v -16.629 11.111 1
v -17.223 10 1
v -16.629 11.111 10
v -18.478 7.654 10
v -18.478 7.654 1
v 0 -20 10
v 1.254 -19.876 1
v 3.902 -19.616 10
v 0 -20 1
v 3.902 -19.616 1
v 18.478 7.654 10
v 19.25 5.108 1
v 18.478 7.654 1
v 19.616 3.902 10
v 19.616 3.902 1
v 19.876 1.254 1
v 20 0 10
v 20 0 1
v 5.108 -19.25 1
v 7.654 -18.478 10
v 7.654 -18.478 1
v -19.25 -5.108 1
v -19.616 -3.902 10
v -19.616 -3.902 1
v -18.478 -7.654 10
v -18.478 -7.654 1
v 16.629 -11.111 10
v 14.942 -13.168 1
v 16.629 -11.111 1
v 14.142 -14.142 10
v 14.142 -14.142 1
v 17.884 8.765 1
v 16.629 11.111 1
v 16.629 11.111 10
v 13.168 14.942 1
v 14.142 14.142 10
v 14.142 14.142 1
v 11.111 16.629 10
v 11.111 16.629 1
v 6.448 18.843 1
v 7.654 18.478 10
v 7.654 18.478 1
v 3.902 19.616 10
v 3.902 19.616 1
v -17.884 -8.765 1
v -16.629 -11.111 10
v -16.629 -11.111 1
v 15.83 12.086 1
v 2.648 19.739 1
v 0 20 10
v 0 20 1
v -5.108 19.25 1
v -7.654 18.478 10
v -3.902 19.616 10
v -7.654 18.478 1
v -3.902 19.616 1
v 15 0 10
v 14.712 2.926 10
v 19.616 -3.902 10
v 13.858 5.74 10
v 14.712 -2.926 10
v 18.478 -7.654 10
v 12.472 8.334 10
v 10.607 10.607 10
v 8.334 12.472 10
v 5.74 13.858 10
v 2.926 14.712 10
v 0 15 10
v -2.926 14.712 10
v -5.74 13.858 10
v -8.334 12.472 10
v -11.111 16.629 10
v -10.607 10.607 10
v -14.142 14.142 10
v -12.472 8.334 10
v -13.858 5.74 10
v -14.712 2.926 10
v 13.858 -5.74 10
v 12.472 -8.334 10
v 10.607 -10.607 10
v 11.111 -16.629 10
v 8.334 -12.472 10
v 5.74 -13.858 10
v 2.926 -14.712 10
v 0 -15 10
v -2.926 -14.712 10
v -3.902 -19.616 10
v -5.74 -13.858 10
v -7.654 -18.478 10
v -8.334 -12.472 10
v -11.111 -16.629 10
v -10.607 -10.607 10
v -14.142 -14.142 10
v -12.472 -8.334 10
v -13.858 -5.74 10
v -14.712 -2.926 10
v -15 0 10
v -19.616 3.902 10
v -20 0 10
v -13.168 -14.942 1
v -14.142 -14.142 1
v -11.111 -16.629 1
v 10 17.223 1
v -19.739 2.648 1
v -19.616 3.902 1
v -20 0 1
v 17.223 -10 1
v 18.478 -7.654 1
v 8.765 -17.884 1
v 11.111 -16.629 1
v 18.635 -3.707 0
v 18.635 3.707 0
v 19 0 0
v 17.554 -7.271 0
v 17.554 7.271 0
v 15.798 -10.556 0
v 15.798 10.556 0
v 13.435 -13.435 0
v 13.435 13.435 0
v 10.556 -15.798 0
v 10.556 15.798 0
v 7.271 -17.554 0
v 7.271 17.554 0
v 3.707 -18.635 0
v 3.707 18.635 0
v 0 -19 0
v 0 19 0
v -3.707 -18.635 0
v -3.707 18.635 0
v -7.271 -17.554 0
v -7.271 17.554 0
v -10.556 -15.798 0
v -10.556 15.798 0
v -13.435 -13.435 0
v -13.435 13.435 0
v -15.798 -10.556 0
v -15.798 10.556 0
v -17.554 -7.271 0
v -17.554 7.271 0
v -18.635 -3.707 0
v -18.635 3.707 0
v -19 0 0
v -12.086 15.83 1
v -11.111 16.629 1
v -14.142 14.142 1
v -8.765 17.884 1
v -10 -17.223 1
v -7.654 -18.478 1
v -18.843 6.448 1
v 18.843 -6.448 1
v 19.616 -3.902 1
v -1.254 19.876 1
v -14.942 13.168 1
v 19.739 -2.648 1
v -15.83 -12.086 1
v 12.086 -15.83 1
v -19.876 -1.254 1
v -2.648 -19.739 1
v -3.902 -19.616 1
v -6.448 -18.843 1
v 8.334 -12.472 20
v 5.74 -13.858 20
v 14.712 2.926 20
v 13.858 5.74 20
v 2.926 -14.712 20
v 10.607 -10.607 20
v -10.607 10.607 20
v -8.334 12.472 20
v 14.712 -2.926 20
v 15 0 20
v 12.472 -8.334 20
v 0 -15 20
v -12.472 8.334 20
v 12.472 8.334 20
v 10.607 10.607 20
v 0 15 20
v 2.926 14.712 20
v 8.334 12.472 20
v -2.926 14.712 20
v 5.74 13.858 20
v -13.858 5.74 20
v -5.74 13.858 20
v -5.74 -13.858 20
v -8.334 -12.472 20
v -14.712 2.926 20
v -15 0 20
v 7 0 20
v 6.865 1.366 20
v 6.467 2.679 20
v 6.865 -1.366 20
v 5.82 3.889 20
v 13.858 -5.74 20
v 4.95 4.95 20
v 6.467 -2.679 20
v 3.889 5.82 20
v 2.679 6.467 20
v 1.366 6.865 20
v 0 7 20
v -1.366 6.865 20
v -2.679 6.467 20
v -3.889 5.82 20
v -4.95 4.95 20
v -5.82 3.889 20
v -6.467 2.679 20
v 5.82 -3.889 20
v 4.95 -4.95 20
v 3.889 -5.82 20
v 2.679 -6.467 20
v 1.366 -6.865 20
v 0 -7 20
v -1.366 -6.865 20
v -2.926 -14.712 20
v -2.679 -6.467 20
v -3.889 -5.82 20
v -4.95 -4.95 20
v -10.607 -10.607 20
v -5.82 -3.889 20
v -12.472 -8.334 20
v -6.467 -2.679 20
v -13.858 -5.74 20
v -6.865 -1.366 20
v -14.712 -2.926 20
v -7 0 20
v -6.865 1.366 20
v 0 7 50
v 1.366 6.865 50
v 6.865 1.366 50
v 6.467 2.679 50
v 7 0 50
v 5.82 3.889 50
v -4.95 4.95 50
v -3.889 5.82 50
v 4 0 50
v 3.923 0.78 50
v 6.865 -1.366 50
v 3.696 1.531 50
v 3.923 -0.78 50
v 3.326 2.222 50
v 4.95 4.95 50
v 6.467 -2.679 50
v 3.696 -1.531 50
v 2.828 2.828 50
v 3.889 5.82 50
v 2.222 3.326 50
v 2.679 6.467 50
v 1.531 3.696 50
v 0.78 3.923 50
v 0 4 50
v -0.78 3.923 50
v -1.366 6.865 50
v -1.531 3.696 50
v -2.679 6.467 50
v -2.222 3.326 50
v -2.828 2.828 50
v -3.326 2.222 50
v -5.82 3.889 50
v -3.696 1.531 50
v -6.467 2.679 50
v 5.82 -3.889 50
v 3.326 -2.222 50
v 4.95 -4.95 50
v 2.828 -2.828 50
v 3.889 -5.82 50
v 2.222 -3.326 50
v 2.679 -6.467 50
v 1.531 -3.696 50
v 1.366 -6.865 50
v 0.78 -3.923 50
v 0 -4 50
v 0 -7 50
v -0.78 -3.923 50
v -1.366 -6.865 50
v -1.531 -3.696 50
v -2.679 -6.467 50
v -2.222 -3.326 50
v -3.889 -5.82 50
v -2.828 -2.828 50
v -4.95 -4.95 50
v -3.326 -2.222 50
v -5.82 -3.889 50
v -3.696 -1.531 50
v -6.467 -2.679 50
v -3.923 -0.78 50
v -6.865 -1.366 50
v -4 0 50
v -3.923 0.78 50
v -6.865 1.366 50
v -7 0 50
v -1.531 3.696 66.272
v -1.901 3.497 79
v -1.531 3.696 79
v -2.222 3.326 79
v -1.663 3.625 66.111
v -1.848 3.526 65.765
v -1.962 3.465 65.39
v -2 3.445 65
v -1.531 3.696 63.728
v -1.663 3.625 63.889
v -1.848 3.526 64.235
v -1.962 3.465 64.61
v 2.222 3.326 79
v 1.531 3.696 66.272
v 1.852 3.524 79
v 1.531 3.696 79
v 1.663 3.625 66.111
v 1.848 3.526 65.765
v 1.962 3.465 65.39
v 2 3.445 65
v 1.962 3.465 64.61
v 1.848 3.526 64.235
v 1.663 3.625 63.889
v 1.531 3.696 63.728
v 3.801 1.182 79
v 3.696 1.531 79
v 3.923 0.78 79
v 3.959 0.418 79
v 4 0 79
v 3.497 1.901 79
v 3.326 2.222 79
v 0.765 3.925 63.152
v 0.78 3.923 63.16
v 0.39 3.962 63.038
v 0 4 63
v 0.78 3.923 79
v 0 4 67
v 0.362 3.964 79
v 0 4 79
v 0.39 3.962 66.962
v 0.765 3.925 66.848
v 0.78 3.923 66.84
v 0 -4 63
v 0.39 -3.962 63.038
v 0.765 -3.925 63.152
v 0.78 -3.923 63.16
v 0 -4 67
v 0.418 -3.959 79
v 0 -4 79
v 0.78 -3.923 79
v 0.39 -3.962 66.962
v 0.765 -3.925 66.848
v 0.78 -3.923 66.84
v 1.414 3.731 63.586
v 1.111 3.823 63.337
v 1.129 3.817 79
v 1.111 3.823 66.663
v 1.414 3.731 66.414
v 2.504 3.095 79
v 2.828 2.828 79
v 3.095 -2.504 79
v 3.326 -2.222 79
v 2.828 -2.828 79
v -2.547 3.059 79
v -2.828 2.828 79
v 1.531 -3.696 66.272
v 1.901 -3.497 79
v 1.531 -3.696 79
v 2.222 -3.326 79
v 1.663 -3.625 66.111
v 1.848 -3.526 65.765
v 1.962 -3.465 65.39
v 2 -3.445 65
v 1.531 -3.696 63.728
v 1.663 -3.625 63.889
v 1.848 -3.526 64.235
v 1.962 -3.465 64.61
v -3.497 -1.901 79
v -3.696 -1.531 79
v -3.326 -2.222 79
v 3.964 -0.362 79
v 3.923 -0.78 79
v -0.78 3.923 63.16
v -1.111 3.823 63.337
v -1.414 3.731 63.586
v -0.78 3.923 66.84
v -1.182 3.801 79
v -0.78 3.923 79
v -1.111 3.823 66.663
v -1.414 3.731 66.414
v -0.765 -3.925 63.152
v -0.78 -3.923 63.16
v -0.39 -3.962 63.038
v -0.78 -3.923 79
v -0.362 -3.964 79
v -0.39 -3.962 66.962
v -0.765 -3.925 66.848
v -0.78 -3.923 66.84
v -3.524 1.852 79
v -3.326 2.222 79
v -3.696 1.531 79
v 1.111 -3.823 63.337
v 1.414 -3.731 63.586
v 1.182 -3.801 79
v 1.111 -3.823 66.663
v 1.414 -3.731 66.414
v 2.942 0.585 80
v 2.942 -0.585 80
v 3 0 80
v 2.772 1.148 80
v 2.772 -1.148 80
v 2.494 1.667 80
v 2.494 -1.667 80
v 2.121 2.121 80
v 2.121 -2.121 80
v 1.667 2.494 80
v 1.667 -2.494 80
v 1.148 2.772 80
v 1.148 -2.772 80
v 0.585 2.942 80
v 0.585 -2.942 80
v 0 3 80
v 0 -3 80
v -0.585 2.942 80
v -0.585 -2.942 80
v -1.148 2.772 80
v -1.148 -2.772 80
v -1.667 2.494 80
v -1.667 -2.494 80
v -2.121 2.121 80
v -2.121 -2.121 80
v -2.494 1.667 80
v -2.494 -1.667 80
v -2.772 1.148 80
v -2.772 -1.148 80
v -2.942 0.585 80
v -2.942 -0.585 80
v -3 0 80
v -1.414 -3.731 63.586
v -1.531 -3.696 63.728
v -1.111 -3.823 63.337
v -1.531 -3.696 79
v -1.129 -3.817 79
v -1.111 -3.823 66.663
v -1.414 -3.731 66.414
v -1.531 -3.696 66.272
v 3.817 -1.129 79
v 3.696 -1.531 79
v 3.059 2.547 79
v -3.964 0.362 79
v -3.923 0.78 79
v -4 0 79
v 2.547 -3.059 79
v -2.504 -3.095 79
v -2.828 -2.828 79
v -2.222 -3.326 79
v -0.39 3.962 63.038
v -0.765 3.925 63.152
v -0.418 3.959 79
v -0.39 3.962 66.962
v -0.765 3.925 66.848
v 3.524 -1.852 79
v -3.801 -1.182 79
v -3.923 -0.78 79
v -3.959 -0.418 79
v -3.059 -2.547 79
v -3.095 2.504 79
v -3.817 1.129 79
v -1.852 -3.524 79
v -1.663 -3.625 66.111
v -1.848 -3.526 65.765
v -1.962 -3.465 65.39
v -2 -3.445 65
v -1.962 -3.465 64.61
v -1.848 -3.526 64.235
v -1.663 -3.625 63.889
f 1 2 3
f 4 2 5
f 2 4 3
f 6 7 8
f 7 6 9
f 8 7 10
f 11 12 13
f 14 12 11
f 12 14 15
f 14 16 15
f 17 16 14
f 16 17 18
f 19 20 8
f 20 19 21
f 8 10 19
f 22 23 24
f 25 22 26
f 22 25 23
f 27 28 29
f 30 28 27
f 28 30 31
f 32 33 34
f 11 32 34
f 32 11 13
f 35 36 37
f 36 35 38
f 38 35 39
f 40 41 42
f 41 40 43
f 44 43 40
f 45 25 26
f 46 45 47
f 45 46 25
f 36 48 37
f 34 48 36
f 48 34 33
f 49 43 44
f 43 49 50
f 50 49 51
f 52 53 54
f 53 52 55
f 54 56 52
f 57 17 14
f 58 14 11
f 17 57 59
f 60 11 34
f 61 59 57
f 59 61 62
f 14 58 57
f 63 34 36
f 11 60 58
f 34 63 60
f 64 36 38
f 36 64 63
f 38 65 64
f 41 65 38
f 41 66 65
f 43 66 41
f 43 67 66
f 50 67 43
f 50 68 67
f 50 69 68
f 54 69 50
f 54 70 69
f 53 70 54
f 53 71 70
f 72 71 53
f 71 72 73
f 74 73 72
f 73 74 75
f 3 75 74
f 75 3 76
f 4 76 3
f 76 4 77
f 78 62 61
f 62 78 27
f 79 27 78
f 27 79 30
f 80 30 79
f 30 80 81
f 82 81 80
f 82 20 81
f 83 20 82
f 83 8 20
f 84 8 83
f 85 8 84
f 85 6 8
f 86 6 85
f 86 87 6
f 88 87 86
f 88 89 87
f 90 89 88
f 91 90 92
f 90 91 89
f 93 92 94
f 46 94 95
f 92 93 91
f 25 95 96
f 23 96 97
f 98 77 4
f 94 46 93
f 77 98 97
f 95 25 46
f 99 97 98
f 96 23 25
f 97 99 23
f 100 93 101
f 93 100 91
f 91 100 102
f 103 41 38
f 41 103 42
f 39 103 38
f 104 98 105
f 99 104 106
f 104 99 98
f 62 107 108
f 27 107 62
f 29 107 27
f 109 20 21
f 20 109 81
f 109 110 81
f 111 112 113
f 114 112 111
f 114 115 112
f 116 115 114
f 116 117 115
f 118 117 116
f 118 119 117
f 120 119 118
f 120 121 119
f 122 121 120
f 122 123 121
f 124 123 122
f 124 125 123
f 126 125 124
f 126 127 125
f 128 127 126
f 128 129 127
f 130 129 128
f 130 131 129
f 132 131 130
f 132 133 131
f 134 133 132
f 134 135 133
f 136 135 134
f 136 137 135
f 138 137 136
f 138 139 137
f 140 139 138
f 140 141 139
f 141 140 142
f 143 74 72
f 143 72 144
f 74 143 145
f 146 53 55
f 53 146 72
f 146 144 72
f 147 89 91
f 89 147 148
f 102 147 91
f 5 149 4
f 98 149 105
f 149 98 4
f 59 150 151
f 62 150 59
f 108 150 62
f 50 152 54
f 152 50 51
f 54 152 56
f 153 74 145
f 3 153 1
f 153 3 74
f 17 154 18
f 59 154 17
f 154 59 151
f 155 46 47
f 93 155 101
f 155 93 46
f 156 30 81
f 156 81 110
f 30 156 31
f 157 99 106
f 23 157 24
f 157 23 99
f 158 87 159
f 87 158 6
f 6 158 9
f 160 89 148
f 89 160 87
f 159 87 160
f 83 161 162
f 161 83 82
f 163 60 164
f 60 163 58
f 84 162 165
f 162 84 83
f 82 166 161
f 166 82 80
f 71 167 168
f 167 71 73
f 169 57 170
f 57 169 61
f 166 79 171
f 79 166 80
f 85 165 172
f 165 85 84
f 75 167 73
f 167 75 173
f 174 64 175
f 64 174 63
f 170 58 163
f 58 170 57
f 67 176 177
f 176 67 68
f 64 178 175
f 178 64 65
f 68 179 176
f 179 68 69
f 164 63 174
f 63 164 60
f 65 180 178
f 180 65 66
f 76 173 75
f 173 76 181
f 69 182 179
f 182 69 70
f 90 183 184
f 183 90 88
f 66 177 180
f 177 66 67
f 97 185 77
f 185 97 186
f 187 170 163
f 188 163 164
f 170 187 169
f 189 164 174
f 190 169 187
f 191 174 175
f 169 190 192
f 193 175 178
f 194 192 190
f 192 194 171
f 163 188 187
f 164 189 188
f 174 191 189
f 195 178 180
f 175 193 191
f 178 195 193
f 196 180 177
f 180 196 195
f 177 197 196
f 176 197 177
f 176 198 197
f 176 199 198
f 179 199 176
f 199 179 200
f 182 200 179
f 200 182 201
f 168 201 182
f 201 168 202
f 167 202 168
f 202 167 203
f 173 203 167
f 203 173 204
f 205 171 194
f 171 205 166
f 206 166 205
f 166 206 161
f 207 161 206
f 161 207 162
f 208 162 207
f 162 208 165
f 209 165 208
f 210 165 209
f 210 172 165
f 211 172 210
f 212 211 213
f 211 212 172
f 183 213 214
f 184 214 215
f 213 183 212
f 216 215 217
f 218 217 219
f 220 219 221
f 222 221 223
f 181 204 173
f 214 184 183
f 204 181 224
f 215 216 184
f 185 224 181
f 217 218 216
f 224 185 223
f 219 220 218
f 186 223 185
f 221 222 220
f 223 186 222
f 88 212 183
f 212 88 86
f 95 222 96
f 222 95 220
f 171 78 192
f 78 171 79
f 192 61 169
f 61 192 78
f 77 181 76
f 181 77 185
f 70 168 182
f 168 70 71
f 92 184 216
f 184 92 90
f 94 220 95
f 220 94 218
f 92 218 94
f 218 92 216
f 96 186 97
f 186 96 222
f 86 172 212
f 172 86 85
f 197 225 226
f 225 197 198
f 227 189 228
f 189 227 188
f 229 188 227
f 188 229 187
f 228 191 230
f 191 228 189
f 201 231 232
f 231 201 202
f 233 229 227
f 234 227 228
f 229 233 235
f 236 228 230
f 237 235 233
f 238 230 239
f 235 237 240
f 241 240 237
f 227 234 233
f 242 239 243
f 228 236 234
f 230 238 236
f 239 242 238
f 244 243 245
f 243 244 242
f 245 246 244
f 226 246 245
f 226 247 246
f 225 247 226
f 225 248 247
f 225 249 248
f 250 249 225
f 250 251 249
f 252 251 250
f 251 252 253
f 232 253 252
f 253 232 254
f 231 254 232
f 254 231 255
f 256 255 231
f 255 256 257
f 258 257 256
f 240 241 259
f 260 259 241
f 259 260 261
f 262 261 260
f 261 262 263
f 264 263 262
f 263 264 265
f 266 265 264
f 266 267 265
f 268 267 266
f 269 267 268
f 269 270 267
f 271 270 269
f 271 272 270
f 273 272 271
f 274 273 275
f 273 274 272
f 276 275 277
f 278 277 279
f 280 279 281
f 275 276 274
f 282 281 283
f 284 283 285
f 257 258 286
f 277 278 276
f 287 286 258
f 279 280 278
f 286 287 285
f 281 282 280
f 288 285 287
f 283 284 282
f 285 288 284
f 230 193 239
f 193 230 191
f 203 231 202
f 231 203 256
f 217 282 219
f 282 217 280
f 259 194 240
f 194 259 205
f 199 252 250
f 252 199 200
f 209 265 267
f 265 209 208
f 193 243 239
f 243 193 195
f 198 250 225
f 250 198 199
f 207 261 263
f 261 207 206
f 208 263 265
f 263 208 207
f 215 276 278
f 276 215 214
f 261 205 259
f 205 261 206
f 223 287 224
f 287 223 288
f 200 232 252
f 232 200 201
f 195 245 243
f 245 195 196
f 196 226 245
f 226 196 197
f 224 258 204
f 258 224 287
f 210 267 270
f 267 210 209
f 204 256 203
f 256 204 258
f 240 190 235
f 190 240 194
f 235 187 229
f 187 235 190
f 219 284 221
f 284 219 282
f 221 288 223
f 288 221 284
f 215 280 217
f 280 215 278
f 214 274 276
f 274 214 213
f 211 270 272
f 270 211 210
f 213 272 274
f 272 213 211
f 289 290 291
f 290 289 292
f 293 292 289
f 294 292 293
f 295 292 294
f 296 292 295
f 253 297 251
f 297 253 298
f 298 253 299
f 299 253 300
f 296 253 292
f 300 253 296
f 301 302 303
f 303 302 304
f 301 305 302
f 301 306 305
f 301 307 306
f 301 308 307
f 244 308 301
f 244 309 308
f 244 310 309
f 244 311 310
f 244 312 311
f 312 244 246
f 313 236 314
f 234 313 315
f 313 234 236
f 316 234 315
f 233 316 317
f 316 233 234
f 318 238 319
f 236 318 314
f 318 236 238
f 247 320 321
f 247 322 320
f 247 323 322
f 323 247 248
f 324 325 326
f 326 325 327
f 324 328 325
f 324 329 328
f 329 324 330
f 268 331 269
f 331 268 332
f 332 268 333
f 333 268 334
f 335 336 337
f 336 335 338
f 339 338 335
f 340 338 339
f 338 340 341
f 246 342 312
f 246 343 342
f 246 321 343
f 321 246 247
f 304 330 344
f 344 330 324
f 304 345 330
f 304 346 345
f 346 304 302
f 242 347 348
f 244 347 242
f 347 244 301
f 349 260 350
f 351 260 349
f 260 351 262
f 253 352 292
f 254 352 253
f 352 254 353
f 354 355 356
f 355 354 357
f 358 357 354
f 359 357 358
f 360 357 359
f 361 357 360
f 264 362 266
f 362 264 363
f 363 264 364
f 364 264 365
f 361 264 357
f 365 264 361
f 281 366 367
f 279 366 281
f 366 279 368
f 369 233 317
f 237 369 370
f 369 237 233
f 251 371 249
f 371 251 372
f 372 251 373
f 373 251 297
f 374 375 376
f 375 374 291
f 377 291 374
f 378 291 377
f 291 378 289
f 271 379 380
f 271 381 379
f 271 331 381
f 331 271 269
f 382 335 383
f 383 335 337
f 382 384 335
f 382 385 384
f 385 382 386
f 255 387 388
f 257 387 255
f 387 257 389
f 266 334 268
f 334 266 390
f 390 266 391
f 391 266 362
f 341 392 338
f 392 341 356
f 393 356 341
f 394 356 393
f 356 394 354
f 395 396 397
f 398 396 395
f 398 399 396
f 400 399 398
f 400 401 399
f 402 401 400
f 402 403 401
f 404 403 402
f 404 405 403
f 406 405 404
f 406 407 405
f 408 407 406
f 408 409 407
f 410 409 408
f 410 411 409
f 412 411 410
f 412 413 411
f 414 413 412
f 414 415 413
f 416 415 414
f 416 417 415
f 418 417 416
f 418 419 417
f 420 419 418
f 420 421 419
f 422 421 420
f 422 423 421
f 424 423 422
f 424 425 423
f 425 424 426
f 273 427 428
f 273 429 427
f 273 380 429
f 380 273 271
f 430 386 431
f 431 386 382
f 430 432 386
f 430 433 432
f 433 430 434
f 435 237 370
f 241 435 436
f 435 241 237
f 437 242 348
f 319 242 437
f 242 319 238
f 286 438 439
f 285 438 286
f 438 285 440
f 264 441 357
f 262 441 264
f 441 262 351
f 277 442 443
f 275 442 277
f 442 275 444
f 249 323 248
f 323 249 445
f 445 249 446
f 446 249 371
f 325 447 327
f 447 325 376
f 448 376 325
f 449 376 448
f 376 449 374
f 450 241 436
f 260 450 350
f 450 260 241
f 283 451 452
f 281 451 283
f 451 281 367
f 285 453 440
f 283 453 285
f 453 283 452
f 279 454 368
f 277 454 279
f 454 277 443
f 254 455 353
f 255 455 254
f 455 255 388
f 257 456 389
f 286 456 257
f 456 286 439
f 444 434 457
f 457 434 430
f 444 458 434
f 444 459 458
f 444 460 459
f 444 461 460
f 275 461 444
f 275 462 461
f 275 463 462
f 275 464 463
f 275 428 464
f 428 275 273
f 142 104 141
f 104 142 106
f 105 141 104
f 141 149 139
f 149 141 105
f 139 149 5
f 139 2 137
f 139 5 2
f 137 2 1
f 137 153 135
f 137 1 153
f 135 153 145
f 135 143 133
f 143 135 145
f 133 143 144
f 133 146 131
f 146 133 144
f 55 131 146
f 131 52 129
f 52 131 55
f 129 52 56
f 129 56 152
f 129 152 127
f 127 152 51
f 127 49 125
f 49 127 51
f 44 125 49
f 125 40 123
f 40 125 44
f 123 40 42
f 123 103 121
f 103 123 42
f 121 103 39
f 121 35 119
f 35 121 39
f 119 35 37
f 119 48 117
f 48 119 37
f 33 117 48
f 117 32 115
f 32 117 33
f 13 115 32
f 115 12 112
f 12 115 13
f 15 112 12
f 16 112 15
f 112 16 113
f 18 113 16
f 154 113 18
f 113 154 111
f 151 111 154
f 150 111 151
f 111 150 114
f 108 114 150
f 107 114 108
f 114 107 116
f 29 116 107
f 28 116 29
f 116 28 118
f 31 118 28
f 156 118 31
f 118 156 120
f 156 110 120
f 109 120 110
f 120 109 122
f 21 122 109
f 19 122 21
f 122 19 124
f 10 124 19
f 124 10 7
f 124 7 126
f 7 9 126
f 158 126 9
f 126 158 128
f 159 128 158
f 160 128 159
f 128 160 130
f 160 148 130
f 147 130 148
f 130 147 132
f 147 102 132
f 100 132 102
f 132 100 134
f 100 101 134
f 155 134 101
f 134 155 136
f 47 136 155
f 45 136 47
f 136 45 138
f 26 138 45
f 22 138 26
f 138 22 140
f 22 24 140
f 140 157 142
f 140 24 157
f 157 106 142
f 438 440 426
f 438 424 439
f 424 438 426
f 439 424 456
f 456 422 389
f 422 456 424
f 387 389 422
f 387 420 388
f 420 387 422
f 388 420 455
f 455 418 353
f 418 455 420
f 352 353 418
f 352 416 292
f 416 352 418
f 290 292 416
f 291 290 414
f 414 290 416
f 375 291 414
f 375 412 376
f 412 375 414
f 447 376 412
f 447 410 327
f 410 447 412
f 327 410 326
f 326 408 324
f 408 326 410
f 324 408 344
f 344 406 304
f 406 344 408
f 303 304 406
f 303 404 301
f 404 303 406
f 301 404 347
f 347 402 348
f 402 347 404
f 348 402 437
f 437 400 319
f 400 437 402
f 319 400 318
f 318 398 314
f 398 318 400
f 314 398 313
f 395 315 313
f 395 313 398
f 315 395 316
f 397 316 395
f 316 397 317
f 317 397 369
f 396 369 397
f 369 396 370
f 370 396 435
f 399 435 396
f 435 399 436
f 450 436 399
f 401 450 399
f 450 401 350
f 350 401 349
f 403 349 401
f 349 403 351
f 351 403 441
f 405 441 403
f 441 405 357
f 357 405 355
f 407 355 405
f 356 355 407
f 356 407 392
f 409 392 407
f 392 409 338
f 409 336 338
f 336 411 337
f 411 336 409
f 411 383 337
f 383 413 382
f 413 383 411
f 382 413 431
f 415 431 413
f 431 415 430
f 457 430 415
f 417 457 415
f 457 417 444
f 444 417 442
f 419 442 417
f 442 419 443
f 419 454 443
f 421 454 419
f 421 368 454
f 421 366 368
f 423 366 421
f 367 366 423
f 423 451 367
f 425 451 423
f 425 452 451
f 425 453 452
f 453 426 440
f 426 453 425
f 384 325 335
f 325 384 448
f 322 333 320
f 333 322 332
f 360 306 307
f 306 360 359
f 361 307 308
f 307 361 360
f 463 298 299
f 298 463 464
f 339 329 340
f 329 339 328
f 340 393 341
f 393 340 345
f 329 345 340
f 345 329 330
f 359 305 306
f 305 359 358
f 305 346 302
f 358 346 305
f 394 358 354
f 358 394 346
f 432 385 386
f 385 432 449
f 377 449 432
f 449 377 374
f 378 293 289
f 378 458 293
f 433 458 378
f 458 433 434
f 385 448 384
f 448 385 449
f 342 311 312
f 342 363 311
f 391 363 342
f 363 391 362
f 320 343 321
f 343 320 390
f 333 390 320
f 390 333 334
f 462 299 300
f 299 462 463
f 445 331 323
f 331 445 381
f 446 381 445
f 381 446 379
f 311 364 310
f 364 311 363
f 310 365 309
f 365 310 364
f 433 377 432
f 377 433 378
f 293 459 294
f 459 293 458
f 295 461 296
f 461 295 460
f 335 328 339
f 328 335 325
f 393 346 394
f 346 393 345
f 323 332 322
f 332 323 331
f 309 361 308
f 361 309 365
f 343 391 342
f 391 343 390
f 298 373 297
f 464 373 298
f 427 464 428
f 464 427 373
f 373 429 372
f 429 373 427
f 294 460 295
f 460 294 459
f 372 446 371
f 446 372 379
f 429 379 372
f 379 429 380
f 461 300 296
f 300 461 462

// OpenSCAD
$fn = 32;

// ----------------------------------------------------------------------
// Stepped shaft: diameters 40, 30, 14, 8 mm, 80 mm long
// ----------------------------------------------------------------------

// --- parameters (mm) ---
d1 = 40;                  // step 1 diameter
len1 = 10;                // step 1 length
d2 = 30;                  // step 2 diameter
len2 = 10;                // step 2 length
d3 = 14;                  // step 3 diameter
len3 = 30;                // step 3 length
d4 = 8;                   // step 4 diameter
len4 = 30;                // step 4 length
total = 80;               // overall length
chamfer = 1;              // end chamfer
cross_d = 4;              // cross pin hole
cross_z = 65;             // cross hole position

difference() {
  /* turned body: stacked cylinders, every step sunk into the bigger one */
  union() {
    cylinder(h = len1, d = d1);
    translate([0, 0, 9.6]) cylinder(h = 10.4, d = d2);
    translate([0, 0, 19.6]) cylinder(h = 30.4, d = d3);
    translate([0, 0, 49.6]) cylinder(h = 30.4, d = d4);
  }
  /* bottom chamfer ring cut */
  rotate_extrude() translate([19, -2.5]) polygon([[0, 0], [3.5, 0], [3.5, 6], [0, 2.5]]);
  /* top chamfer ring cut */
  rotate_extrude() translate([3, 80]) polygon([[0, 0], [3.5, -3.5], [3.5, 2.5], [0, 2.5]]);
  /* cross pin hole through the small step */
  translate([0, 0, cross_z]) rotate([90, 0, 0]) cylinder(h = d4 + 5, d = cross_d, center = true);
}
